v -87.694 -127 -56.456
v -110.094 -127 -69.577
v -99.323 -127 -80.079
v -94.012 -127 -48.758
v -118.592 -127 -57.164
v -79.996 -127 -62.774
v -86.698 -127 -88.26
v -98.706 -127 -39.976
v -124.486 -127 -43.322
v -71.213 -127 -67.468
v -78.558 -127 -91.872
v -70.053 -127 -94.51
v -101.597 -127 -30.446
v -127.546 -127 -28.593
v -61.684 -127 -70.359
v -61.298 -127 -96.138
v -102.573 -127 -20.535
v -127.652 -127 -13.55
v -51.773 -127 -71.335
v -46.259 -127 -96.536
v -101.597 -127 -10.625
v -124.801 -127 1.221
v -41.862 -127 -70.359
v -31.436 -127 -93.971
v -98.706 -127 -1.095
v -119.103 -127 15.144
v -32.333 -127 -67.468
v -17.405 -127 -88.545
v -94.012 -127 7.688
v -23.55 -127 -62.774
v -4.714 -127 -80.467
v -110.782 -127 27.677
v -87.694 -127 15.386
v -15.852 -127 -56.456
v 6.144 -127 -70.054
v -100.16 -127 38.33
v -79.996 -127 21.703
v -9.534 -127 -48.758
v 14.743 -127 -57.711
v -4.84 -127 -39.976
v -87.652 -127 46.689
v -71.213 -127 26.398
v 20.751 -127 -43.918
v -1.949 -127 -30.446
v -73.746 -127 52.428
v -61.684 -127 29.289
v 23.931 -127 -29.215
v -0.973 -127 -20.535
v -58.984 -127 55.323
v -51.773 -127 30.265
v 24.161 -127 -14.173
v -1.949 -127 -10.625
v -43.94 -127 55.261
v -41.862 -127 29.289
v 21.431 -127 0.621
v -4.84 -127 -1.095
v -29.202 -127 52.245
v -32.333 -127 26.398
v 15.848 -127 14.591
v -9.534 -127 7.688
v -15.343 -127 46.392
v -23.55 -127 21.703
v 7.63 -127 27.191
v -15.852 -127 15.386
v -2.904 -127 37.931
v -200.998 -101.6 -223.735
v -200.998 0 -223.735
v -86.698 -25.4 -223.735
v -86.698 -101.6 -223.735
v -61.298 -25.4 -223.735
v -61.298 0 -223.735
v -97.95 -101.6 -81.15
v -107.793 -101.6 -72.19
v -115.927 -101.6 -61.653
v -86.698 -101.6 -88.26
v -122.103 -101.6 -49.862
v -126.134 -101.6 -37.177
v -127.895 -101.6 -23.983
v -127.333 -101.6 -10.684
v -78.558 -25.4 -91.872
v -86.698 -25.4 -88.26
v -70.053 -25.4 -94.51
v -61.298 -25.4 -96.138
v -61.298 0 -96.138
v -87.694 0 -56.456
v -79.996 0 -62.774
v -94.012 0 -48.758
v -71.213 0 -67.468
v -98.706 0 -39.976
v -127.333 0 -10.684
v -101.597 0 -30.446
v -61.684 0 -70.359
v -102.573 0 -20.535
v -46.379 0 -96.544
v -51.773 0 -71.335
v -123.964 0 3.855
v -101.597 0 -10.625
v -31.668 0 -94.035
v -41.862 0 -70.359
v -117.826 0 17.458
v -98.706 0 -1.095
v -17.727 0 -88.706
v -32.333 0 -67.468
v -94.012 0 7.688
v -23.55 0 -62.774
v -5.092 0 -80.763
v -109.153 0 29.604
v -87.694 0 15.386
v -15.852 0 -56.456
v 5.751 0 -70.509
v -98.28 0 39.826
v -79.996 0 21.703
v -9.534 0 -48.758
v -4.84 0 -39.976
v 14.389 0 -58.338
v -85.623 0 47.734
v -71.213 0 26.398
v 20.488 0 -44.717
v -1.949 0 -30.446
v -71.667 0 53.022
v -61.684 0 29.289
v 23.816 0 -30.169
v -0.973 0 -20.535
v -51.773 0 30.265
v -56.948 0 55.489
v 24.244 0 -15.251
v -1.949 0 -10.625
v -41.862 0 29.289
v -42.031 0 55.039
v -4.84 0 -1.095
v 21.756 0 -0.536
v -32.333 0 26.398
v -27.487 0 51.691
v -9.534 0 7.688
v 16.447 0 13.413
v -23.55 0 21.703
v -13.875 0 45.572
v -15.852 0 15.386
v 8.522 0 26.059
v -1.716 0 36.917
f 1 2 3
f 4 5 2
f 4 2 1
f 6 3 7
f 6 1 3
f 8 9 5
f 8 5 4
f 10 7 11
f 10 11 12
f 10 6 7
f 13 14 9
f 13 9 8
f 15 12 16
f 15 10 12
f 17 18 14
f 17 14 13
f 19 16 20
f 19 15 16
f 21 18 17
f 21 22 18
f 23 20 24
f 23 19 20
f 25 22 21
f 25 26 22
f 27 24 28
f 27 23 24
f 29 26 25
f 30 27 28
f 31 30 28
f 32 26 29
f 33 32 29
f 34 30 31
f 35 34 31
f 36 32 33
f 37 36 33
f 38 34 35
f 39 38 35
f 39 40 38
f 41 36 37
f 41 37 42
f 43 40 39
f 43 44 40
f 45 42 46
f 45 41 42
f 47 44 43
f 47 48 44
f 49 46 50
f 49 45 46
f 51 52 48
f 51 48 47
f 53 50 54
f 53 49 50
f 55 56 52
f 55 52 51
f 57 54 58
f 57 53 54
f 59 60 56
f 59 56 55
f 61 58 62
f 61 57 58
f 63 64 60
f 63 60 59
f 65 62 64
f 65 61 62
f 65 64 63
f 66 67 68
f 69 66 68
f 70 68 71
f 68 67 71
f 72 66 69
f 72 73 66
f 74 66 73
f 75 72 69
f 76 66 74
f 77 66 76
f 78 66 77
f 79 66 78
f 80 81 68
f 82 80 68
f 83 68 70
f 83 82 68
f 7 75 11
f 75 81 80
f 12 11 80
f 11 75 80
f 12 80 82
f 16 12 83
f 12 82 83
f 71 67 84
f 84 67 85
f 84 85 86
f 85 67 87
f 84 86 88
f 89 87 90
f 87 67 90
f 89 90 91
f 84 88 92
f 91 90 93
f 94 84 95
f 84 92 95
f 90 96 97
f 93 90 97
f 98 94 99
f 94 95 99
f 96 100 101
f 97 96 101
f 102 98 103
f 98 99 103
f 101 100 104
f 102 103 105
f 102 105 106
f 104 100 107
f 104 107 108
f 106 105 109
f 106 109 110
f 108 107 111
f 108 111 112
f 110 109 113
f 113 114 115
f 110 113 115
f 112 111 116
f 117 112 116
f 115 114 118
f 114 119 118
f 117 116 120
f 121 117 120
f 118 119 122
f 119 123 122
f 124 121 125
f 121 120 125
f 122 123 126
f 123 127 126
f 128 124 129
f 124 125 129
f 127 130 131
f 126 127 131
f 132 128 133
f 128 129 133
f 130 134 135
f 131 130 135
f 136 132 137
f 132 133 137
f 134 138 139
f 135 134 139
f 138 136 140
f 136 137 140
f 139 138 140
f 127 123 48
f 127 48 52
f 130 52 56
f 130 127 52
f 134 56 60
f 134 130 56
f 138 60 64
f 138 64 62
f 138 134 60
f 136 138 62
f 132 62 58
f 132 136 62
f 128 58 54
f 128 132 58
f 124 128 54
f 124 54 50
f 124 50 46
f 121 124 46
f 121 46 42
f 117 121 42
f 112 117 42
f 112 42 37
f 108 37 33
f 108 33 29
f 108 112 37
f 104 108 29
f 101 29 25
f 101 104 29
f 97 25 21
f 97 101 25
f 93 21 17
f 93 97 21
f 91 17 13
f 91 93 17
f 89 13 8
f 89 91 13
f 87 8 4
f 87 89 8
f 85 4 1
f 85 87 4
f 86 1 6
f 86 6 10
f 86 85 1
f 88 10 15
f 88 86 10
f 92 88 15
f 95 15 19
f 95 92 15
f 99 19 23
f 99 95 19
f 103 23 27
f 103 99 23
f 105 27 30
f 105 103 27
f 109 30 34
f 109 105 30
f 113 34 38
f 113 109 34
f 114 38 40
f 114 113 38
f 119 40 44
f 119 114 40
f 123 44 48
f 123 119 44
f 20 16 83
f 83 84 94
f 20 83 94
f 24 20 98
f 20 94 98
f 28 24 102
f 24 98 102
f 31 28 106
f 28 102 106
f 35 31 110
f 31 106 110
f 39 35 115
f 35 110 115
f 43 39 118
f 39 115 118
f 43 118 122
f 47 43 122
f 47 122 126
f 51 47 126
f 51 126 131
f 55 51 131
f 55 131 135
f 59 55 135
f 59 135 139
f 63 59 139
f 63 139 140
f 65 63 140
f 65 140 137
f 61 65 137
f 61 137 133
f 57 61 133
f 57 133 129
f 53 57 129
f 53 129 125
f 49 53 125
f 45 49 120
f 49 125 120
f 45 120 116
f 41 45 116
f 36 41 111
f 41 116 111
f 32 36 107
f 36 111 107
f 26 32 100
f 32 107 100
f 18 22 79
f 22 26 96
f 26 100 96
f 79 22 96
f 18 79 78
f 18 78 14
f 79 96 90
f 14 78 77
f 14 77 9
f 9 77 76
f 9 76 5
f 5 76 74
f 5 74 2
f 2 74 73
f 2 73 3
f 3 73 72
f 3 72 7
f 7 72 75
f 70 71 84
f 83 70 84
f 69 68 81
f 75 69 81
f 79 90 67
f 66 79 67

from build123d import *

# Parameters (mm, degrees)
F0_R     = 50.8
F1_DEPTH = 127
F2_DEPTH = 101.6
F4_DEPTH = 25.4


# Not quite as in the source:
# - a feature of the source that left no trace in its solid (it failed there, or was rolled back) is left out


with BuildPart() as f1:
    # F0 (on Front) → F1 (new body)
    with BuildSketch(Plane.XZ):
        with BuildLine():
            ThreePointArc((-61.2979337454, -96.1375838272), (-1.3713712696, -77.6852401135), (24.4270662546, -20.5352401135))
            ThreePointArc((24.4270662546, -20.5352401135), (24.2670376819, -15.5993769332), (23.7876241198, -10.6842454887))
            ThreePointArc((23.7876241198, -10.6842454887), (-51.7729337454, 55.6647598865), (-127.3334916106, -10.6842454887))
            ThreePointArc((-127.3334916106, -10.6842454887), (-119.2731253406, -55.8929003106), (-86.6979337454, -88.260304713))
            ThreePointArc((-86.6979337454, -88.260304713), (-74.3442320368, -93.3155705156), (-61.2979337454, -96.1375838272))
        make_face()
        with Locations((-51.7729337454, -20.5352401135)):
            Circle(F0_R, mode=Mode.SUBTRACT)
    extrude(amount=F1_DEPTH)

    # F0 (on Front) → F2 (join)
    with BuildSketch(Plane.XZ):
        with BuildLine():
            ThreePointArc((-86.6979337454, -88.260304713), (-119.2731253406, -55.8929003106), (-127.3334916106, -10.6842454887))
            Line((-127.3334916106, -10.6842454887), (-200.9979337454, -223.7352401135))
            Line((-200.9979337454, -223.7352401135), (-86.6979337454, -223.7352401135))
            Line((-86.6979337454, -223.7352401135), (-86.6979337454, -88.260304713))
        make_face()
    extrude(amount=F2_DEPTH)

    # F0 (on Front) → F4 (join)
    with BuildSketch(Plane.XZ):
        with BuildLine():
            Line((-61.2979337454, -223.7352401135), (-61.2979337454, -96.1375838272))
            ThreePointArc((-61.2979337454, -96.1375838272), (-74.3442320368, -93.3155705156), (-86.6979337454, -88.260304713))
            Line((-86.6979337454, -88.260304713), (-86.6979337454, -223.7352401135))
            Line((-86.6979337454, -223.7352401135), (-61.2979337454, -223.7352401135))
        make_face()
    extrude(amount=F4_DEPTH)


solid = f1.part
